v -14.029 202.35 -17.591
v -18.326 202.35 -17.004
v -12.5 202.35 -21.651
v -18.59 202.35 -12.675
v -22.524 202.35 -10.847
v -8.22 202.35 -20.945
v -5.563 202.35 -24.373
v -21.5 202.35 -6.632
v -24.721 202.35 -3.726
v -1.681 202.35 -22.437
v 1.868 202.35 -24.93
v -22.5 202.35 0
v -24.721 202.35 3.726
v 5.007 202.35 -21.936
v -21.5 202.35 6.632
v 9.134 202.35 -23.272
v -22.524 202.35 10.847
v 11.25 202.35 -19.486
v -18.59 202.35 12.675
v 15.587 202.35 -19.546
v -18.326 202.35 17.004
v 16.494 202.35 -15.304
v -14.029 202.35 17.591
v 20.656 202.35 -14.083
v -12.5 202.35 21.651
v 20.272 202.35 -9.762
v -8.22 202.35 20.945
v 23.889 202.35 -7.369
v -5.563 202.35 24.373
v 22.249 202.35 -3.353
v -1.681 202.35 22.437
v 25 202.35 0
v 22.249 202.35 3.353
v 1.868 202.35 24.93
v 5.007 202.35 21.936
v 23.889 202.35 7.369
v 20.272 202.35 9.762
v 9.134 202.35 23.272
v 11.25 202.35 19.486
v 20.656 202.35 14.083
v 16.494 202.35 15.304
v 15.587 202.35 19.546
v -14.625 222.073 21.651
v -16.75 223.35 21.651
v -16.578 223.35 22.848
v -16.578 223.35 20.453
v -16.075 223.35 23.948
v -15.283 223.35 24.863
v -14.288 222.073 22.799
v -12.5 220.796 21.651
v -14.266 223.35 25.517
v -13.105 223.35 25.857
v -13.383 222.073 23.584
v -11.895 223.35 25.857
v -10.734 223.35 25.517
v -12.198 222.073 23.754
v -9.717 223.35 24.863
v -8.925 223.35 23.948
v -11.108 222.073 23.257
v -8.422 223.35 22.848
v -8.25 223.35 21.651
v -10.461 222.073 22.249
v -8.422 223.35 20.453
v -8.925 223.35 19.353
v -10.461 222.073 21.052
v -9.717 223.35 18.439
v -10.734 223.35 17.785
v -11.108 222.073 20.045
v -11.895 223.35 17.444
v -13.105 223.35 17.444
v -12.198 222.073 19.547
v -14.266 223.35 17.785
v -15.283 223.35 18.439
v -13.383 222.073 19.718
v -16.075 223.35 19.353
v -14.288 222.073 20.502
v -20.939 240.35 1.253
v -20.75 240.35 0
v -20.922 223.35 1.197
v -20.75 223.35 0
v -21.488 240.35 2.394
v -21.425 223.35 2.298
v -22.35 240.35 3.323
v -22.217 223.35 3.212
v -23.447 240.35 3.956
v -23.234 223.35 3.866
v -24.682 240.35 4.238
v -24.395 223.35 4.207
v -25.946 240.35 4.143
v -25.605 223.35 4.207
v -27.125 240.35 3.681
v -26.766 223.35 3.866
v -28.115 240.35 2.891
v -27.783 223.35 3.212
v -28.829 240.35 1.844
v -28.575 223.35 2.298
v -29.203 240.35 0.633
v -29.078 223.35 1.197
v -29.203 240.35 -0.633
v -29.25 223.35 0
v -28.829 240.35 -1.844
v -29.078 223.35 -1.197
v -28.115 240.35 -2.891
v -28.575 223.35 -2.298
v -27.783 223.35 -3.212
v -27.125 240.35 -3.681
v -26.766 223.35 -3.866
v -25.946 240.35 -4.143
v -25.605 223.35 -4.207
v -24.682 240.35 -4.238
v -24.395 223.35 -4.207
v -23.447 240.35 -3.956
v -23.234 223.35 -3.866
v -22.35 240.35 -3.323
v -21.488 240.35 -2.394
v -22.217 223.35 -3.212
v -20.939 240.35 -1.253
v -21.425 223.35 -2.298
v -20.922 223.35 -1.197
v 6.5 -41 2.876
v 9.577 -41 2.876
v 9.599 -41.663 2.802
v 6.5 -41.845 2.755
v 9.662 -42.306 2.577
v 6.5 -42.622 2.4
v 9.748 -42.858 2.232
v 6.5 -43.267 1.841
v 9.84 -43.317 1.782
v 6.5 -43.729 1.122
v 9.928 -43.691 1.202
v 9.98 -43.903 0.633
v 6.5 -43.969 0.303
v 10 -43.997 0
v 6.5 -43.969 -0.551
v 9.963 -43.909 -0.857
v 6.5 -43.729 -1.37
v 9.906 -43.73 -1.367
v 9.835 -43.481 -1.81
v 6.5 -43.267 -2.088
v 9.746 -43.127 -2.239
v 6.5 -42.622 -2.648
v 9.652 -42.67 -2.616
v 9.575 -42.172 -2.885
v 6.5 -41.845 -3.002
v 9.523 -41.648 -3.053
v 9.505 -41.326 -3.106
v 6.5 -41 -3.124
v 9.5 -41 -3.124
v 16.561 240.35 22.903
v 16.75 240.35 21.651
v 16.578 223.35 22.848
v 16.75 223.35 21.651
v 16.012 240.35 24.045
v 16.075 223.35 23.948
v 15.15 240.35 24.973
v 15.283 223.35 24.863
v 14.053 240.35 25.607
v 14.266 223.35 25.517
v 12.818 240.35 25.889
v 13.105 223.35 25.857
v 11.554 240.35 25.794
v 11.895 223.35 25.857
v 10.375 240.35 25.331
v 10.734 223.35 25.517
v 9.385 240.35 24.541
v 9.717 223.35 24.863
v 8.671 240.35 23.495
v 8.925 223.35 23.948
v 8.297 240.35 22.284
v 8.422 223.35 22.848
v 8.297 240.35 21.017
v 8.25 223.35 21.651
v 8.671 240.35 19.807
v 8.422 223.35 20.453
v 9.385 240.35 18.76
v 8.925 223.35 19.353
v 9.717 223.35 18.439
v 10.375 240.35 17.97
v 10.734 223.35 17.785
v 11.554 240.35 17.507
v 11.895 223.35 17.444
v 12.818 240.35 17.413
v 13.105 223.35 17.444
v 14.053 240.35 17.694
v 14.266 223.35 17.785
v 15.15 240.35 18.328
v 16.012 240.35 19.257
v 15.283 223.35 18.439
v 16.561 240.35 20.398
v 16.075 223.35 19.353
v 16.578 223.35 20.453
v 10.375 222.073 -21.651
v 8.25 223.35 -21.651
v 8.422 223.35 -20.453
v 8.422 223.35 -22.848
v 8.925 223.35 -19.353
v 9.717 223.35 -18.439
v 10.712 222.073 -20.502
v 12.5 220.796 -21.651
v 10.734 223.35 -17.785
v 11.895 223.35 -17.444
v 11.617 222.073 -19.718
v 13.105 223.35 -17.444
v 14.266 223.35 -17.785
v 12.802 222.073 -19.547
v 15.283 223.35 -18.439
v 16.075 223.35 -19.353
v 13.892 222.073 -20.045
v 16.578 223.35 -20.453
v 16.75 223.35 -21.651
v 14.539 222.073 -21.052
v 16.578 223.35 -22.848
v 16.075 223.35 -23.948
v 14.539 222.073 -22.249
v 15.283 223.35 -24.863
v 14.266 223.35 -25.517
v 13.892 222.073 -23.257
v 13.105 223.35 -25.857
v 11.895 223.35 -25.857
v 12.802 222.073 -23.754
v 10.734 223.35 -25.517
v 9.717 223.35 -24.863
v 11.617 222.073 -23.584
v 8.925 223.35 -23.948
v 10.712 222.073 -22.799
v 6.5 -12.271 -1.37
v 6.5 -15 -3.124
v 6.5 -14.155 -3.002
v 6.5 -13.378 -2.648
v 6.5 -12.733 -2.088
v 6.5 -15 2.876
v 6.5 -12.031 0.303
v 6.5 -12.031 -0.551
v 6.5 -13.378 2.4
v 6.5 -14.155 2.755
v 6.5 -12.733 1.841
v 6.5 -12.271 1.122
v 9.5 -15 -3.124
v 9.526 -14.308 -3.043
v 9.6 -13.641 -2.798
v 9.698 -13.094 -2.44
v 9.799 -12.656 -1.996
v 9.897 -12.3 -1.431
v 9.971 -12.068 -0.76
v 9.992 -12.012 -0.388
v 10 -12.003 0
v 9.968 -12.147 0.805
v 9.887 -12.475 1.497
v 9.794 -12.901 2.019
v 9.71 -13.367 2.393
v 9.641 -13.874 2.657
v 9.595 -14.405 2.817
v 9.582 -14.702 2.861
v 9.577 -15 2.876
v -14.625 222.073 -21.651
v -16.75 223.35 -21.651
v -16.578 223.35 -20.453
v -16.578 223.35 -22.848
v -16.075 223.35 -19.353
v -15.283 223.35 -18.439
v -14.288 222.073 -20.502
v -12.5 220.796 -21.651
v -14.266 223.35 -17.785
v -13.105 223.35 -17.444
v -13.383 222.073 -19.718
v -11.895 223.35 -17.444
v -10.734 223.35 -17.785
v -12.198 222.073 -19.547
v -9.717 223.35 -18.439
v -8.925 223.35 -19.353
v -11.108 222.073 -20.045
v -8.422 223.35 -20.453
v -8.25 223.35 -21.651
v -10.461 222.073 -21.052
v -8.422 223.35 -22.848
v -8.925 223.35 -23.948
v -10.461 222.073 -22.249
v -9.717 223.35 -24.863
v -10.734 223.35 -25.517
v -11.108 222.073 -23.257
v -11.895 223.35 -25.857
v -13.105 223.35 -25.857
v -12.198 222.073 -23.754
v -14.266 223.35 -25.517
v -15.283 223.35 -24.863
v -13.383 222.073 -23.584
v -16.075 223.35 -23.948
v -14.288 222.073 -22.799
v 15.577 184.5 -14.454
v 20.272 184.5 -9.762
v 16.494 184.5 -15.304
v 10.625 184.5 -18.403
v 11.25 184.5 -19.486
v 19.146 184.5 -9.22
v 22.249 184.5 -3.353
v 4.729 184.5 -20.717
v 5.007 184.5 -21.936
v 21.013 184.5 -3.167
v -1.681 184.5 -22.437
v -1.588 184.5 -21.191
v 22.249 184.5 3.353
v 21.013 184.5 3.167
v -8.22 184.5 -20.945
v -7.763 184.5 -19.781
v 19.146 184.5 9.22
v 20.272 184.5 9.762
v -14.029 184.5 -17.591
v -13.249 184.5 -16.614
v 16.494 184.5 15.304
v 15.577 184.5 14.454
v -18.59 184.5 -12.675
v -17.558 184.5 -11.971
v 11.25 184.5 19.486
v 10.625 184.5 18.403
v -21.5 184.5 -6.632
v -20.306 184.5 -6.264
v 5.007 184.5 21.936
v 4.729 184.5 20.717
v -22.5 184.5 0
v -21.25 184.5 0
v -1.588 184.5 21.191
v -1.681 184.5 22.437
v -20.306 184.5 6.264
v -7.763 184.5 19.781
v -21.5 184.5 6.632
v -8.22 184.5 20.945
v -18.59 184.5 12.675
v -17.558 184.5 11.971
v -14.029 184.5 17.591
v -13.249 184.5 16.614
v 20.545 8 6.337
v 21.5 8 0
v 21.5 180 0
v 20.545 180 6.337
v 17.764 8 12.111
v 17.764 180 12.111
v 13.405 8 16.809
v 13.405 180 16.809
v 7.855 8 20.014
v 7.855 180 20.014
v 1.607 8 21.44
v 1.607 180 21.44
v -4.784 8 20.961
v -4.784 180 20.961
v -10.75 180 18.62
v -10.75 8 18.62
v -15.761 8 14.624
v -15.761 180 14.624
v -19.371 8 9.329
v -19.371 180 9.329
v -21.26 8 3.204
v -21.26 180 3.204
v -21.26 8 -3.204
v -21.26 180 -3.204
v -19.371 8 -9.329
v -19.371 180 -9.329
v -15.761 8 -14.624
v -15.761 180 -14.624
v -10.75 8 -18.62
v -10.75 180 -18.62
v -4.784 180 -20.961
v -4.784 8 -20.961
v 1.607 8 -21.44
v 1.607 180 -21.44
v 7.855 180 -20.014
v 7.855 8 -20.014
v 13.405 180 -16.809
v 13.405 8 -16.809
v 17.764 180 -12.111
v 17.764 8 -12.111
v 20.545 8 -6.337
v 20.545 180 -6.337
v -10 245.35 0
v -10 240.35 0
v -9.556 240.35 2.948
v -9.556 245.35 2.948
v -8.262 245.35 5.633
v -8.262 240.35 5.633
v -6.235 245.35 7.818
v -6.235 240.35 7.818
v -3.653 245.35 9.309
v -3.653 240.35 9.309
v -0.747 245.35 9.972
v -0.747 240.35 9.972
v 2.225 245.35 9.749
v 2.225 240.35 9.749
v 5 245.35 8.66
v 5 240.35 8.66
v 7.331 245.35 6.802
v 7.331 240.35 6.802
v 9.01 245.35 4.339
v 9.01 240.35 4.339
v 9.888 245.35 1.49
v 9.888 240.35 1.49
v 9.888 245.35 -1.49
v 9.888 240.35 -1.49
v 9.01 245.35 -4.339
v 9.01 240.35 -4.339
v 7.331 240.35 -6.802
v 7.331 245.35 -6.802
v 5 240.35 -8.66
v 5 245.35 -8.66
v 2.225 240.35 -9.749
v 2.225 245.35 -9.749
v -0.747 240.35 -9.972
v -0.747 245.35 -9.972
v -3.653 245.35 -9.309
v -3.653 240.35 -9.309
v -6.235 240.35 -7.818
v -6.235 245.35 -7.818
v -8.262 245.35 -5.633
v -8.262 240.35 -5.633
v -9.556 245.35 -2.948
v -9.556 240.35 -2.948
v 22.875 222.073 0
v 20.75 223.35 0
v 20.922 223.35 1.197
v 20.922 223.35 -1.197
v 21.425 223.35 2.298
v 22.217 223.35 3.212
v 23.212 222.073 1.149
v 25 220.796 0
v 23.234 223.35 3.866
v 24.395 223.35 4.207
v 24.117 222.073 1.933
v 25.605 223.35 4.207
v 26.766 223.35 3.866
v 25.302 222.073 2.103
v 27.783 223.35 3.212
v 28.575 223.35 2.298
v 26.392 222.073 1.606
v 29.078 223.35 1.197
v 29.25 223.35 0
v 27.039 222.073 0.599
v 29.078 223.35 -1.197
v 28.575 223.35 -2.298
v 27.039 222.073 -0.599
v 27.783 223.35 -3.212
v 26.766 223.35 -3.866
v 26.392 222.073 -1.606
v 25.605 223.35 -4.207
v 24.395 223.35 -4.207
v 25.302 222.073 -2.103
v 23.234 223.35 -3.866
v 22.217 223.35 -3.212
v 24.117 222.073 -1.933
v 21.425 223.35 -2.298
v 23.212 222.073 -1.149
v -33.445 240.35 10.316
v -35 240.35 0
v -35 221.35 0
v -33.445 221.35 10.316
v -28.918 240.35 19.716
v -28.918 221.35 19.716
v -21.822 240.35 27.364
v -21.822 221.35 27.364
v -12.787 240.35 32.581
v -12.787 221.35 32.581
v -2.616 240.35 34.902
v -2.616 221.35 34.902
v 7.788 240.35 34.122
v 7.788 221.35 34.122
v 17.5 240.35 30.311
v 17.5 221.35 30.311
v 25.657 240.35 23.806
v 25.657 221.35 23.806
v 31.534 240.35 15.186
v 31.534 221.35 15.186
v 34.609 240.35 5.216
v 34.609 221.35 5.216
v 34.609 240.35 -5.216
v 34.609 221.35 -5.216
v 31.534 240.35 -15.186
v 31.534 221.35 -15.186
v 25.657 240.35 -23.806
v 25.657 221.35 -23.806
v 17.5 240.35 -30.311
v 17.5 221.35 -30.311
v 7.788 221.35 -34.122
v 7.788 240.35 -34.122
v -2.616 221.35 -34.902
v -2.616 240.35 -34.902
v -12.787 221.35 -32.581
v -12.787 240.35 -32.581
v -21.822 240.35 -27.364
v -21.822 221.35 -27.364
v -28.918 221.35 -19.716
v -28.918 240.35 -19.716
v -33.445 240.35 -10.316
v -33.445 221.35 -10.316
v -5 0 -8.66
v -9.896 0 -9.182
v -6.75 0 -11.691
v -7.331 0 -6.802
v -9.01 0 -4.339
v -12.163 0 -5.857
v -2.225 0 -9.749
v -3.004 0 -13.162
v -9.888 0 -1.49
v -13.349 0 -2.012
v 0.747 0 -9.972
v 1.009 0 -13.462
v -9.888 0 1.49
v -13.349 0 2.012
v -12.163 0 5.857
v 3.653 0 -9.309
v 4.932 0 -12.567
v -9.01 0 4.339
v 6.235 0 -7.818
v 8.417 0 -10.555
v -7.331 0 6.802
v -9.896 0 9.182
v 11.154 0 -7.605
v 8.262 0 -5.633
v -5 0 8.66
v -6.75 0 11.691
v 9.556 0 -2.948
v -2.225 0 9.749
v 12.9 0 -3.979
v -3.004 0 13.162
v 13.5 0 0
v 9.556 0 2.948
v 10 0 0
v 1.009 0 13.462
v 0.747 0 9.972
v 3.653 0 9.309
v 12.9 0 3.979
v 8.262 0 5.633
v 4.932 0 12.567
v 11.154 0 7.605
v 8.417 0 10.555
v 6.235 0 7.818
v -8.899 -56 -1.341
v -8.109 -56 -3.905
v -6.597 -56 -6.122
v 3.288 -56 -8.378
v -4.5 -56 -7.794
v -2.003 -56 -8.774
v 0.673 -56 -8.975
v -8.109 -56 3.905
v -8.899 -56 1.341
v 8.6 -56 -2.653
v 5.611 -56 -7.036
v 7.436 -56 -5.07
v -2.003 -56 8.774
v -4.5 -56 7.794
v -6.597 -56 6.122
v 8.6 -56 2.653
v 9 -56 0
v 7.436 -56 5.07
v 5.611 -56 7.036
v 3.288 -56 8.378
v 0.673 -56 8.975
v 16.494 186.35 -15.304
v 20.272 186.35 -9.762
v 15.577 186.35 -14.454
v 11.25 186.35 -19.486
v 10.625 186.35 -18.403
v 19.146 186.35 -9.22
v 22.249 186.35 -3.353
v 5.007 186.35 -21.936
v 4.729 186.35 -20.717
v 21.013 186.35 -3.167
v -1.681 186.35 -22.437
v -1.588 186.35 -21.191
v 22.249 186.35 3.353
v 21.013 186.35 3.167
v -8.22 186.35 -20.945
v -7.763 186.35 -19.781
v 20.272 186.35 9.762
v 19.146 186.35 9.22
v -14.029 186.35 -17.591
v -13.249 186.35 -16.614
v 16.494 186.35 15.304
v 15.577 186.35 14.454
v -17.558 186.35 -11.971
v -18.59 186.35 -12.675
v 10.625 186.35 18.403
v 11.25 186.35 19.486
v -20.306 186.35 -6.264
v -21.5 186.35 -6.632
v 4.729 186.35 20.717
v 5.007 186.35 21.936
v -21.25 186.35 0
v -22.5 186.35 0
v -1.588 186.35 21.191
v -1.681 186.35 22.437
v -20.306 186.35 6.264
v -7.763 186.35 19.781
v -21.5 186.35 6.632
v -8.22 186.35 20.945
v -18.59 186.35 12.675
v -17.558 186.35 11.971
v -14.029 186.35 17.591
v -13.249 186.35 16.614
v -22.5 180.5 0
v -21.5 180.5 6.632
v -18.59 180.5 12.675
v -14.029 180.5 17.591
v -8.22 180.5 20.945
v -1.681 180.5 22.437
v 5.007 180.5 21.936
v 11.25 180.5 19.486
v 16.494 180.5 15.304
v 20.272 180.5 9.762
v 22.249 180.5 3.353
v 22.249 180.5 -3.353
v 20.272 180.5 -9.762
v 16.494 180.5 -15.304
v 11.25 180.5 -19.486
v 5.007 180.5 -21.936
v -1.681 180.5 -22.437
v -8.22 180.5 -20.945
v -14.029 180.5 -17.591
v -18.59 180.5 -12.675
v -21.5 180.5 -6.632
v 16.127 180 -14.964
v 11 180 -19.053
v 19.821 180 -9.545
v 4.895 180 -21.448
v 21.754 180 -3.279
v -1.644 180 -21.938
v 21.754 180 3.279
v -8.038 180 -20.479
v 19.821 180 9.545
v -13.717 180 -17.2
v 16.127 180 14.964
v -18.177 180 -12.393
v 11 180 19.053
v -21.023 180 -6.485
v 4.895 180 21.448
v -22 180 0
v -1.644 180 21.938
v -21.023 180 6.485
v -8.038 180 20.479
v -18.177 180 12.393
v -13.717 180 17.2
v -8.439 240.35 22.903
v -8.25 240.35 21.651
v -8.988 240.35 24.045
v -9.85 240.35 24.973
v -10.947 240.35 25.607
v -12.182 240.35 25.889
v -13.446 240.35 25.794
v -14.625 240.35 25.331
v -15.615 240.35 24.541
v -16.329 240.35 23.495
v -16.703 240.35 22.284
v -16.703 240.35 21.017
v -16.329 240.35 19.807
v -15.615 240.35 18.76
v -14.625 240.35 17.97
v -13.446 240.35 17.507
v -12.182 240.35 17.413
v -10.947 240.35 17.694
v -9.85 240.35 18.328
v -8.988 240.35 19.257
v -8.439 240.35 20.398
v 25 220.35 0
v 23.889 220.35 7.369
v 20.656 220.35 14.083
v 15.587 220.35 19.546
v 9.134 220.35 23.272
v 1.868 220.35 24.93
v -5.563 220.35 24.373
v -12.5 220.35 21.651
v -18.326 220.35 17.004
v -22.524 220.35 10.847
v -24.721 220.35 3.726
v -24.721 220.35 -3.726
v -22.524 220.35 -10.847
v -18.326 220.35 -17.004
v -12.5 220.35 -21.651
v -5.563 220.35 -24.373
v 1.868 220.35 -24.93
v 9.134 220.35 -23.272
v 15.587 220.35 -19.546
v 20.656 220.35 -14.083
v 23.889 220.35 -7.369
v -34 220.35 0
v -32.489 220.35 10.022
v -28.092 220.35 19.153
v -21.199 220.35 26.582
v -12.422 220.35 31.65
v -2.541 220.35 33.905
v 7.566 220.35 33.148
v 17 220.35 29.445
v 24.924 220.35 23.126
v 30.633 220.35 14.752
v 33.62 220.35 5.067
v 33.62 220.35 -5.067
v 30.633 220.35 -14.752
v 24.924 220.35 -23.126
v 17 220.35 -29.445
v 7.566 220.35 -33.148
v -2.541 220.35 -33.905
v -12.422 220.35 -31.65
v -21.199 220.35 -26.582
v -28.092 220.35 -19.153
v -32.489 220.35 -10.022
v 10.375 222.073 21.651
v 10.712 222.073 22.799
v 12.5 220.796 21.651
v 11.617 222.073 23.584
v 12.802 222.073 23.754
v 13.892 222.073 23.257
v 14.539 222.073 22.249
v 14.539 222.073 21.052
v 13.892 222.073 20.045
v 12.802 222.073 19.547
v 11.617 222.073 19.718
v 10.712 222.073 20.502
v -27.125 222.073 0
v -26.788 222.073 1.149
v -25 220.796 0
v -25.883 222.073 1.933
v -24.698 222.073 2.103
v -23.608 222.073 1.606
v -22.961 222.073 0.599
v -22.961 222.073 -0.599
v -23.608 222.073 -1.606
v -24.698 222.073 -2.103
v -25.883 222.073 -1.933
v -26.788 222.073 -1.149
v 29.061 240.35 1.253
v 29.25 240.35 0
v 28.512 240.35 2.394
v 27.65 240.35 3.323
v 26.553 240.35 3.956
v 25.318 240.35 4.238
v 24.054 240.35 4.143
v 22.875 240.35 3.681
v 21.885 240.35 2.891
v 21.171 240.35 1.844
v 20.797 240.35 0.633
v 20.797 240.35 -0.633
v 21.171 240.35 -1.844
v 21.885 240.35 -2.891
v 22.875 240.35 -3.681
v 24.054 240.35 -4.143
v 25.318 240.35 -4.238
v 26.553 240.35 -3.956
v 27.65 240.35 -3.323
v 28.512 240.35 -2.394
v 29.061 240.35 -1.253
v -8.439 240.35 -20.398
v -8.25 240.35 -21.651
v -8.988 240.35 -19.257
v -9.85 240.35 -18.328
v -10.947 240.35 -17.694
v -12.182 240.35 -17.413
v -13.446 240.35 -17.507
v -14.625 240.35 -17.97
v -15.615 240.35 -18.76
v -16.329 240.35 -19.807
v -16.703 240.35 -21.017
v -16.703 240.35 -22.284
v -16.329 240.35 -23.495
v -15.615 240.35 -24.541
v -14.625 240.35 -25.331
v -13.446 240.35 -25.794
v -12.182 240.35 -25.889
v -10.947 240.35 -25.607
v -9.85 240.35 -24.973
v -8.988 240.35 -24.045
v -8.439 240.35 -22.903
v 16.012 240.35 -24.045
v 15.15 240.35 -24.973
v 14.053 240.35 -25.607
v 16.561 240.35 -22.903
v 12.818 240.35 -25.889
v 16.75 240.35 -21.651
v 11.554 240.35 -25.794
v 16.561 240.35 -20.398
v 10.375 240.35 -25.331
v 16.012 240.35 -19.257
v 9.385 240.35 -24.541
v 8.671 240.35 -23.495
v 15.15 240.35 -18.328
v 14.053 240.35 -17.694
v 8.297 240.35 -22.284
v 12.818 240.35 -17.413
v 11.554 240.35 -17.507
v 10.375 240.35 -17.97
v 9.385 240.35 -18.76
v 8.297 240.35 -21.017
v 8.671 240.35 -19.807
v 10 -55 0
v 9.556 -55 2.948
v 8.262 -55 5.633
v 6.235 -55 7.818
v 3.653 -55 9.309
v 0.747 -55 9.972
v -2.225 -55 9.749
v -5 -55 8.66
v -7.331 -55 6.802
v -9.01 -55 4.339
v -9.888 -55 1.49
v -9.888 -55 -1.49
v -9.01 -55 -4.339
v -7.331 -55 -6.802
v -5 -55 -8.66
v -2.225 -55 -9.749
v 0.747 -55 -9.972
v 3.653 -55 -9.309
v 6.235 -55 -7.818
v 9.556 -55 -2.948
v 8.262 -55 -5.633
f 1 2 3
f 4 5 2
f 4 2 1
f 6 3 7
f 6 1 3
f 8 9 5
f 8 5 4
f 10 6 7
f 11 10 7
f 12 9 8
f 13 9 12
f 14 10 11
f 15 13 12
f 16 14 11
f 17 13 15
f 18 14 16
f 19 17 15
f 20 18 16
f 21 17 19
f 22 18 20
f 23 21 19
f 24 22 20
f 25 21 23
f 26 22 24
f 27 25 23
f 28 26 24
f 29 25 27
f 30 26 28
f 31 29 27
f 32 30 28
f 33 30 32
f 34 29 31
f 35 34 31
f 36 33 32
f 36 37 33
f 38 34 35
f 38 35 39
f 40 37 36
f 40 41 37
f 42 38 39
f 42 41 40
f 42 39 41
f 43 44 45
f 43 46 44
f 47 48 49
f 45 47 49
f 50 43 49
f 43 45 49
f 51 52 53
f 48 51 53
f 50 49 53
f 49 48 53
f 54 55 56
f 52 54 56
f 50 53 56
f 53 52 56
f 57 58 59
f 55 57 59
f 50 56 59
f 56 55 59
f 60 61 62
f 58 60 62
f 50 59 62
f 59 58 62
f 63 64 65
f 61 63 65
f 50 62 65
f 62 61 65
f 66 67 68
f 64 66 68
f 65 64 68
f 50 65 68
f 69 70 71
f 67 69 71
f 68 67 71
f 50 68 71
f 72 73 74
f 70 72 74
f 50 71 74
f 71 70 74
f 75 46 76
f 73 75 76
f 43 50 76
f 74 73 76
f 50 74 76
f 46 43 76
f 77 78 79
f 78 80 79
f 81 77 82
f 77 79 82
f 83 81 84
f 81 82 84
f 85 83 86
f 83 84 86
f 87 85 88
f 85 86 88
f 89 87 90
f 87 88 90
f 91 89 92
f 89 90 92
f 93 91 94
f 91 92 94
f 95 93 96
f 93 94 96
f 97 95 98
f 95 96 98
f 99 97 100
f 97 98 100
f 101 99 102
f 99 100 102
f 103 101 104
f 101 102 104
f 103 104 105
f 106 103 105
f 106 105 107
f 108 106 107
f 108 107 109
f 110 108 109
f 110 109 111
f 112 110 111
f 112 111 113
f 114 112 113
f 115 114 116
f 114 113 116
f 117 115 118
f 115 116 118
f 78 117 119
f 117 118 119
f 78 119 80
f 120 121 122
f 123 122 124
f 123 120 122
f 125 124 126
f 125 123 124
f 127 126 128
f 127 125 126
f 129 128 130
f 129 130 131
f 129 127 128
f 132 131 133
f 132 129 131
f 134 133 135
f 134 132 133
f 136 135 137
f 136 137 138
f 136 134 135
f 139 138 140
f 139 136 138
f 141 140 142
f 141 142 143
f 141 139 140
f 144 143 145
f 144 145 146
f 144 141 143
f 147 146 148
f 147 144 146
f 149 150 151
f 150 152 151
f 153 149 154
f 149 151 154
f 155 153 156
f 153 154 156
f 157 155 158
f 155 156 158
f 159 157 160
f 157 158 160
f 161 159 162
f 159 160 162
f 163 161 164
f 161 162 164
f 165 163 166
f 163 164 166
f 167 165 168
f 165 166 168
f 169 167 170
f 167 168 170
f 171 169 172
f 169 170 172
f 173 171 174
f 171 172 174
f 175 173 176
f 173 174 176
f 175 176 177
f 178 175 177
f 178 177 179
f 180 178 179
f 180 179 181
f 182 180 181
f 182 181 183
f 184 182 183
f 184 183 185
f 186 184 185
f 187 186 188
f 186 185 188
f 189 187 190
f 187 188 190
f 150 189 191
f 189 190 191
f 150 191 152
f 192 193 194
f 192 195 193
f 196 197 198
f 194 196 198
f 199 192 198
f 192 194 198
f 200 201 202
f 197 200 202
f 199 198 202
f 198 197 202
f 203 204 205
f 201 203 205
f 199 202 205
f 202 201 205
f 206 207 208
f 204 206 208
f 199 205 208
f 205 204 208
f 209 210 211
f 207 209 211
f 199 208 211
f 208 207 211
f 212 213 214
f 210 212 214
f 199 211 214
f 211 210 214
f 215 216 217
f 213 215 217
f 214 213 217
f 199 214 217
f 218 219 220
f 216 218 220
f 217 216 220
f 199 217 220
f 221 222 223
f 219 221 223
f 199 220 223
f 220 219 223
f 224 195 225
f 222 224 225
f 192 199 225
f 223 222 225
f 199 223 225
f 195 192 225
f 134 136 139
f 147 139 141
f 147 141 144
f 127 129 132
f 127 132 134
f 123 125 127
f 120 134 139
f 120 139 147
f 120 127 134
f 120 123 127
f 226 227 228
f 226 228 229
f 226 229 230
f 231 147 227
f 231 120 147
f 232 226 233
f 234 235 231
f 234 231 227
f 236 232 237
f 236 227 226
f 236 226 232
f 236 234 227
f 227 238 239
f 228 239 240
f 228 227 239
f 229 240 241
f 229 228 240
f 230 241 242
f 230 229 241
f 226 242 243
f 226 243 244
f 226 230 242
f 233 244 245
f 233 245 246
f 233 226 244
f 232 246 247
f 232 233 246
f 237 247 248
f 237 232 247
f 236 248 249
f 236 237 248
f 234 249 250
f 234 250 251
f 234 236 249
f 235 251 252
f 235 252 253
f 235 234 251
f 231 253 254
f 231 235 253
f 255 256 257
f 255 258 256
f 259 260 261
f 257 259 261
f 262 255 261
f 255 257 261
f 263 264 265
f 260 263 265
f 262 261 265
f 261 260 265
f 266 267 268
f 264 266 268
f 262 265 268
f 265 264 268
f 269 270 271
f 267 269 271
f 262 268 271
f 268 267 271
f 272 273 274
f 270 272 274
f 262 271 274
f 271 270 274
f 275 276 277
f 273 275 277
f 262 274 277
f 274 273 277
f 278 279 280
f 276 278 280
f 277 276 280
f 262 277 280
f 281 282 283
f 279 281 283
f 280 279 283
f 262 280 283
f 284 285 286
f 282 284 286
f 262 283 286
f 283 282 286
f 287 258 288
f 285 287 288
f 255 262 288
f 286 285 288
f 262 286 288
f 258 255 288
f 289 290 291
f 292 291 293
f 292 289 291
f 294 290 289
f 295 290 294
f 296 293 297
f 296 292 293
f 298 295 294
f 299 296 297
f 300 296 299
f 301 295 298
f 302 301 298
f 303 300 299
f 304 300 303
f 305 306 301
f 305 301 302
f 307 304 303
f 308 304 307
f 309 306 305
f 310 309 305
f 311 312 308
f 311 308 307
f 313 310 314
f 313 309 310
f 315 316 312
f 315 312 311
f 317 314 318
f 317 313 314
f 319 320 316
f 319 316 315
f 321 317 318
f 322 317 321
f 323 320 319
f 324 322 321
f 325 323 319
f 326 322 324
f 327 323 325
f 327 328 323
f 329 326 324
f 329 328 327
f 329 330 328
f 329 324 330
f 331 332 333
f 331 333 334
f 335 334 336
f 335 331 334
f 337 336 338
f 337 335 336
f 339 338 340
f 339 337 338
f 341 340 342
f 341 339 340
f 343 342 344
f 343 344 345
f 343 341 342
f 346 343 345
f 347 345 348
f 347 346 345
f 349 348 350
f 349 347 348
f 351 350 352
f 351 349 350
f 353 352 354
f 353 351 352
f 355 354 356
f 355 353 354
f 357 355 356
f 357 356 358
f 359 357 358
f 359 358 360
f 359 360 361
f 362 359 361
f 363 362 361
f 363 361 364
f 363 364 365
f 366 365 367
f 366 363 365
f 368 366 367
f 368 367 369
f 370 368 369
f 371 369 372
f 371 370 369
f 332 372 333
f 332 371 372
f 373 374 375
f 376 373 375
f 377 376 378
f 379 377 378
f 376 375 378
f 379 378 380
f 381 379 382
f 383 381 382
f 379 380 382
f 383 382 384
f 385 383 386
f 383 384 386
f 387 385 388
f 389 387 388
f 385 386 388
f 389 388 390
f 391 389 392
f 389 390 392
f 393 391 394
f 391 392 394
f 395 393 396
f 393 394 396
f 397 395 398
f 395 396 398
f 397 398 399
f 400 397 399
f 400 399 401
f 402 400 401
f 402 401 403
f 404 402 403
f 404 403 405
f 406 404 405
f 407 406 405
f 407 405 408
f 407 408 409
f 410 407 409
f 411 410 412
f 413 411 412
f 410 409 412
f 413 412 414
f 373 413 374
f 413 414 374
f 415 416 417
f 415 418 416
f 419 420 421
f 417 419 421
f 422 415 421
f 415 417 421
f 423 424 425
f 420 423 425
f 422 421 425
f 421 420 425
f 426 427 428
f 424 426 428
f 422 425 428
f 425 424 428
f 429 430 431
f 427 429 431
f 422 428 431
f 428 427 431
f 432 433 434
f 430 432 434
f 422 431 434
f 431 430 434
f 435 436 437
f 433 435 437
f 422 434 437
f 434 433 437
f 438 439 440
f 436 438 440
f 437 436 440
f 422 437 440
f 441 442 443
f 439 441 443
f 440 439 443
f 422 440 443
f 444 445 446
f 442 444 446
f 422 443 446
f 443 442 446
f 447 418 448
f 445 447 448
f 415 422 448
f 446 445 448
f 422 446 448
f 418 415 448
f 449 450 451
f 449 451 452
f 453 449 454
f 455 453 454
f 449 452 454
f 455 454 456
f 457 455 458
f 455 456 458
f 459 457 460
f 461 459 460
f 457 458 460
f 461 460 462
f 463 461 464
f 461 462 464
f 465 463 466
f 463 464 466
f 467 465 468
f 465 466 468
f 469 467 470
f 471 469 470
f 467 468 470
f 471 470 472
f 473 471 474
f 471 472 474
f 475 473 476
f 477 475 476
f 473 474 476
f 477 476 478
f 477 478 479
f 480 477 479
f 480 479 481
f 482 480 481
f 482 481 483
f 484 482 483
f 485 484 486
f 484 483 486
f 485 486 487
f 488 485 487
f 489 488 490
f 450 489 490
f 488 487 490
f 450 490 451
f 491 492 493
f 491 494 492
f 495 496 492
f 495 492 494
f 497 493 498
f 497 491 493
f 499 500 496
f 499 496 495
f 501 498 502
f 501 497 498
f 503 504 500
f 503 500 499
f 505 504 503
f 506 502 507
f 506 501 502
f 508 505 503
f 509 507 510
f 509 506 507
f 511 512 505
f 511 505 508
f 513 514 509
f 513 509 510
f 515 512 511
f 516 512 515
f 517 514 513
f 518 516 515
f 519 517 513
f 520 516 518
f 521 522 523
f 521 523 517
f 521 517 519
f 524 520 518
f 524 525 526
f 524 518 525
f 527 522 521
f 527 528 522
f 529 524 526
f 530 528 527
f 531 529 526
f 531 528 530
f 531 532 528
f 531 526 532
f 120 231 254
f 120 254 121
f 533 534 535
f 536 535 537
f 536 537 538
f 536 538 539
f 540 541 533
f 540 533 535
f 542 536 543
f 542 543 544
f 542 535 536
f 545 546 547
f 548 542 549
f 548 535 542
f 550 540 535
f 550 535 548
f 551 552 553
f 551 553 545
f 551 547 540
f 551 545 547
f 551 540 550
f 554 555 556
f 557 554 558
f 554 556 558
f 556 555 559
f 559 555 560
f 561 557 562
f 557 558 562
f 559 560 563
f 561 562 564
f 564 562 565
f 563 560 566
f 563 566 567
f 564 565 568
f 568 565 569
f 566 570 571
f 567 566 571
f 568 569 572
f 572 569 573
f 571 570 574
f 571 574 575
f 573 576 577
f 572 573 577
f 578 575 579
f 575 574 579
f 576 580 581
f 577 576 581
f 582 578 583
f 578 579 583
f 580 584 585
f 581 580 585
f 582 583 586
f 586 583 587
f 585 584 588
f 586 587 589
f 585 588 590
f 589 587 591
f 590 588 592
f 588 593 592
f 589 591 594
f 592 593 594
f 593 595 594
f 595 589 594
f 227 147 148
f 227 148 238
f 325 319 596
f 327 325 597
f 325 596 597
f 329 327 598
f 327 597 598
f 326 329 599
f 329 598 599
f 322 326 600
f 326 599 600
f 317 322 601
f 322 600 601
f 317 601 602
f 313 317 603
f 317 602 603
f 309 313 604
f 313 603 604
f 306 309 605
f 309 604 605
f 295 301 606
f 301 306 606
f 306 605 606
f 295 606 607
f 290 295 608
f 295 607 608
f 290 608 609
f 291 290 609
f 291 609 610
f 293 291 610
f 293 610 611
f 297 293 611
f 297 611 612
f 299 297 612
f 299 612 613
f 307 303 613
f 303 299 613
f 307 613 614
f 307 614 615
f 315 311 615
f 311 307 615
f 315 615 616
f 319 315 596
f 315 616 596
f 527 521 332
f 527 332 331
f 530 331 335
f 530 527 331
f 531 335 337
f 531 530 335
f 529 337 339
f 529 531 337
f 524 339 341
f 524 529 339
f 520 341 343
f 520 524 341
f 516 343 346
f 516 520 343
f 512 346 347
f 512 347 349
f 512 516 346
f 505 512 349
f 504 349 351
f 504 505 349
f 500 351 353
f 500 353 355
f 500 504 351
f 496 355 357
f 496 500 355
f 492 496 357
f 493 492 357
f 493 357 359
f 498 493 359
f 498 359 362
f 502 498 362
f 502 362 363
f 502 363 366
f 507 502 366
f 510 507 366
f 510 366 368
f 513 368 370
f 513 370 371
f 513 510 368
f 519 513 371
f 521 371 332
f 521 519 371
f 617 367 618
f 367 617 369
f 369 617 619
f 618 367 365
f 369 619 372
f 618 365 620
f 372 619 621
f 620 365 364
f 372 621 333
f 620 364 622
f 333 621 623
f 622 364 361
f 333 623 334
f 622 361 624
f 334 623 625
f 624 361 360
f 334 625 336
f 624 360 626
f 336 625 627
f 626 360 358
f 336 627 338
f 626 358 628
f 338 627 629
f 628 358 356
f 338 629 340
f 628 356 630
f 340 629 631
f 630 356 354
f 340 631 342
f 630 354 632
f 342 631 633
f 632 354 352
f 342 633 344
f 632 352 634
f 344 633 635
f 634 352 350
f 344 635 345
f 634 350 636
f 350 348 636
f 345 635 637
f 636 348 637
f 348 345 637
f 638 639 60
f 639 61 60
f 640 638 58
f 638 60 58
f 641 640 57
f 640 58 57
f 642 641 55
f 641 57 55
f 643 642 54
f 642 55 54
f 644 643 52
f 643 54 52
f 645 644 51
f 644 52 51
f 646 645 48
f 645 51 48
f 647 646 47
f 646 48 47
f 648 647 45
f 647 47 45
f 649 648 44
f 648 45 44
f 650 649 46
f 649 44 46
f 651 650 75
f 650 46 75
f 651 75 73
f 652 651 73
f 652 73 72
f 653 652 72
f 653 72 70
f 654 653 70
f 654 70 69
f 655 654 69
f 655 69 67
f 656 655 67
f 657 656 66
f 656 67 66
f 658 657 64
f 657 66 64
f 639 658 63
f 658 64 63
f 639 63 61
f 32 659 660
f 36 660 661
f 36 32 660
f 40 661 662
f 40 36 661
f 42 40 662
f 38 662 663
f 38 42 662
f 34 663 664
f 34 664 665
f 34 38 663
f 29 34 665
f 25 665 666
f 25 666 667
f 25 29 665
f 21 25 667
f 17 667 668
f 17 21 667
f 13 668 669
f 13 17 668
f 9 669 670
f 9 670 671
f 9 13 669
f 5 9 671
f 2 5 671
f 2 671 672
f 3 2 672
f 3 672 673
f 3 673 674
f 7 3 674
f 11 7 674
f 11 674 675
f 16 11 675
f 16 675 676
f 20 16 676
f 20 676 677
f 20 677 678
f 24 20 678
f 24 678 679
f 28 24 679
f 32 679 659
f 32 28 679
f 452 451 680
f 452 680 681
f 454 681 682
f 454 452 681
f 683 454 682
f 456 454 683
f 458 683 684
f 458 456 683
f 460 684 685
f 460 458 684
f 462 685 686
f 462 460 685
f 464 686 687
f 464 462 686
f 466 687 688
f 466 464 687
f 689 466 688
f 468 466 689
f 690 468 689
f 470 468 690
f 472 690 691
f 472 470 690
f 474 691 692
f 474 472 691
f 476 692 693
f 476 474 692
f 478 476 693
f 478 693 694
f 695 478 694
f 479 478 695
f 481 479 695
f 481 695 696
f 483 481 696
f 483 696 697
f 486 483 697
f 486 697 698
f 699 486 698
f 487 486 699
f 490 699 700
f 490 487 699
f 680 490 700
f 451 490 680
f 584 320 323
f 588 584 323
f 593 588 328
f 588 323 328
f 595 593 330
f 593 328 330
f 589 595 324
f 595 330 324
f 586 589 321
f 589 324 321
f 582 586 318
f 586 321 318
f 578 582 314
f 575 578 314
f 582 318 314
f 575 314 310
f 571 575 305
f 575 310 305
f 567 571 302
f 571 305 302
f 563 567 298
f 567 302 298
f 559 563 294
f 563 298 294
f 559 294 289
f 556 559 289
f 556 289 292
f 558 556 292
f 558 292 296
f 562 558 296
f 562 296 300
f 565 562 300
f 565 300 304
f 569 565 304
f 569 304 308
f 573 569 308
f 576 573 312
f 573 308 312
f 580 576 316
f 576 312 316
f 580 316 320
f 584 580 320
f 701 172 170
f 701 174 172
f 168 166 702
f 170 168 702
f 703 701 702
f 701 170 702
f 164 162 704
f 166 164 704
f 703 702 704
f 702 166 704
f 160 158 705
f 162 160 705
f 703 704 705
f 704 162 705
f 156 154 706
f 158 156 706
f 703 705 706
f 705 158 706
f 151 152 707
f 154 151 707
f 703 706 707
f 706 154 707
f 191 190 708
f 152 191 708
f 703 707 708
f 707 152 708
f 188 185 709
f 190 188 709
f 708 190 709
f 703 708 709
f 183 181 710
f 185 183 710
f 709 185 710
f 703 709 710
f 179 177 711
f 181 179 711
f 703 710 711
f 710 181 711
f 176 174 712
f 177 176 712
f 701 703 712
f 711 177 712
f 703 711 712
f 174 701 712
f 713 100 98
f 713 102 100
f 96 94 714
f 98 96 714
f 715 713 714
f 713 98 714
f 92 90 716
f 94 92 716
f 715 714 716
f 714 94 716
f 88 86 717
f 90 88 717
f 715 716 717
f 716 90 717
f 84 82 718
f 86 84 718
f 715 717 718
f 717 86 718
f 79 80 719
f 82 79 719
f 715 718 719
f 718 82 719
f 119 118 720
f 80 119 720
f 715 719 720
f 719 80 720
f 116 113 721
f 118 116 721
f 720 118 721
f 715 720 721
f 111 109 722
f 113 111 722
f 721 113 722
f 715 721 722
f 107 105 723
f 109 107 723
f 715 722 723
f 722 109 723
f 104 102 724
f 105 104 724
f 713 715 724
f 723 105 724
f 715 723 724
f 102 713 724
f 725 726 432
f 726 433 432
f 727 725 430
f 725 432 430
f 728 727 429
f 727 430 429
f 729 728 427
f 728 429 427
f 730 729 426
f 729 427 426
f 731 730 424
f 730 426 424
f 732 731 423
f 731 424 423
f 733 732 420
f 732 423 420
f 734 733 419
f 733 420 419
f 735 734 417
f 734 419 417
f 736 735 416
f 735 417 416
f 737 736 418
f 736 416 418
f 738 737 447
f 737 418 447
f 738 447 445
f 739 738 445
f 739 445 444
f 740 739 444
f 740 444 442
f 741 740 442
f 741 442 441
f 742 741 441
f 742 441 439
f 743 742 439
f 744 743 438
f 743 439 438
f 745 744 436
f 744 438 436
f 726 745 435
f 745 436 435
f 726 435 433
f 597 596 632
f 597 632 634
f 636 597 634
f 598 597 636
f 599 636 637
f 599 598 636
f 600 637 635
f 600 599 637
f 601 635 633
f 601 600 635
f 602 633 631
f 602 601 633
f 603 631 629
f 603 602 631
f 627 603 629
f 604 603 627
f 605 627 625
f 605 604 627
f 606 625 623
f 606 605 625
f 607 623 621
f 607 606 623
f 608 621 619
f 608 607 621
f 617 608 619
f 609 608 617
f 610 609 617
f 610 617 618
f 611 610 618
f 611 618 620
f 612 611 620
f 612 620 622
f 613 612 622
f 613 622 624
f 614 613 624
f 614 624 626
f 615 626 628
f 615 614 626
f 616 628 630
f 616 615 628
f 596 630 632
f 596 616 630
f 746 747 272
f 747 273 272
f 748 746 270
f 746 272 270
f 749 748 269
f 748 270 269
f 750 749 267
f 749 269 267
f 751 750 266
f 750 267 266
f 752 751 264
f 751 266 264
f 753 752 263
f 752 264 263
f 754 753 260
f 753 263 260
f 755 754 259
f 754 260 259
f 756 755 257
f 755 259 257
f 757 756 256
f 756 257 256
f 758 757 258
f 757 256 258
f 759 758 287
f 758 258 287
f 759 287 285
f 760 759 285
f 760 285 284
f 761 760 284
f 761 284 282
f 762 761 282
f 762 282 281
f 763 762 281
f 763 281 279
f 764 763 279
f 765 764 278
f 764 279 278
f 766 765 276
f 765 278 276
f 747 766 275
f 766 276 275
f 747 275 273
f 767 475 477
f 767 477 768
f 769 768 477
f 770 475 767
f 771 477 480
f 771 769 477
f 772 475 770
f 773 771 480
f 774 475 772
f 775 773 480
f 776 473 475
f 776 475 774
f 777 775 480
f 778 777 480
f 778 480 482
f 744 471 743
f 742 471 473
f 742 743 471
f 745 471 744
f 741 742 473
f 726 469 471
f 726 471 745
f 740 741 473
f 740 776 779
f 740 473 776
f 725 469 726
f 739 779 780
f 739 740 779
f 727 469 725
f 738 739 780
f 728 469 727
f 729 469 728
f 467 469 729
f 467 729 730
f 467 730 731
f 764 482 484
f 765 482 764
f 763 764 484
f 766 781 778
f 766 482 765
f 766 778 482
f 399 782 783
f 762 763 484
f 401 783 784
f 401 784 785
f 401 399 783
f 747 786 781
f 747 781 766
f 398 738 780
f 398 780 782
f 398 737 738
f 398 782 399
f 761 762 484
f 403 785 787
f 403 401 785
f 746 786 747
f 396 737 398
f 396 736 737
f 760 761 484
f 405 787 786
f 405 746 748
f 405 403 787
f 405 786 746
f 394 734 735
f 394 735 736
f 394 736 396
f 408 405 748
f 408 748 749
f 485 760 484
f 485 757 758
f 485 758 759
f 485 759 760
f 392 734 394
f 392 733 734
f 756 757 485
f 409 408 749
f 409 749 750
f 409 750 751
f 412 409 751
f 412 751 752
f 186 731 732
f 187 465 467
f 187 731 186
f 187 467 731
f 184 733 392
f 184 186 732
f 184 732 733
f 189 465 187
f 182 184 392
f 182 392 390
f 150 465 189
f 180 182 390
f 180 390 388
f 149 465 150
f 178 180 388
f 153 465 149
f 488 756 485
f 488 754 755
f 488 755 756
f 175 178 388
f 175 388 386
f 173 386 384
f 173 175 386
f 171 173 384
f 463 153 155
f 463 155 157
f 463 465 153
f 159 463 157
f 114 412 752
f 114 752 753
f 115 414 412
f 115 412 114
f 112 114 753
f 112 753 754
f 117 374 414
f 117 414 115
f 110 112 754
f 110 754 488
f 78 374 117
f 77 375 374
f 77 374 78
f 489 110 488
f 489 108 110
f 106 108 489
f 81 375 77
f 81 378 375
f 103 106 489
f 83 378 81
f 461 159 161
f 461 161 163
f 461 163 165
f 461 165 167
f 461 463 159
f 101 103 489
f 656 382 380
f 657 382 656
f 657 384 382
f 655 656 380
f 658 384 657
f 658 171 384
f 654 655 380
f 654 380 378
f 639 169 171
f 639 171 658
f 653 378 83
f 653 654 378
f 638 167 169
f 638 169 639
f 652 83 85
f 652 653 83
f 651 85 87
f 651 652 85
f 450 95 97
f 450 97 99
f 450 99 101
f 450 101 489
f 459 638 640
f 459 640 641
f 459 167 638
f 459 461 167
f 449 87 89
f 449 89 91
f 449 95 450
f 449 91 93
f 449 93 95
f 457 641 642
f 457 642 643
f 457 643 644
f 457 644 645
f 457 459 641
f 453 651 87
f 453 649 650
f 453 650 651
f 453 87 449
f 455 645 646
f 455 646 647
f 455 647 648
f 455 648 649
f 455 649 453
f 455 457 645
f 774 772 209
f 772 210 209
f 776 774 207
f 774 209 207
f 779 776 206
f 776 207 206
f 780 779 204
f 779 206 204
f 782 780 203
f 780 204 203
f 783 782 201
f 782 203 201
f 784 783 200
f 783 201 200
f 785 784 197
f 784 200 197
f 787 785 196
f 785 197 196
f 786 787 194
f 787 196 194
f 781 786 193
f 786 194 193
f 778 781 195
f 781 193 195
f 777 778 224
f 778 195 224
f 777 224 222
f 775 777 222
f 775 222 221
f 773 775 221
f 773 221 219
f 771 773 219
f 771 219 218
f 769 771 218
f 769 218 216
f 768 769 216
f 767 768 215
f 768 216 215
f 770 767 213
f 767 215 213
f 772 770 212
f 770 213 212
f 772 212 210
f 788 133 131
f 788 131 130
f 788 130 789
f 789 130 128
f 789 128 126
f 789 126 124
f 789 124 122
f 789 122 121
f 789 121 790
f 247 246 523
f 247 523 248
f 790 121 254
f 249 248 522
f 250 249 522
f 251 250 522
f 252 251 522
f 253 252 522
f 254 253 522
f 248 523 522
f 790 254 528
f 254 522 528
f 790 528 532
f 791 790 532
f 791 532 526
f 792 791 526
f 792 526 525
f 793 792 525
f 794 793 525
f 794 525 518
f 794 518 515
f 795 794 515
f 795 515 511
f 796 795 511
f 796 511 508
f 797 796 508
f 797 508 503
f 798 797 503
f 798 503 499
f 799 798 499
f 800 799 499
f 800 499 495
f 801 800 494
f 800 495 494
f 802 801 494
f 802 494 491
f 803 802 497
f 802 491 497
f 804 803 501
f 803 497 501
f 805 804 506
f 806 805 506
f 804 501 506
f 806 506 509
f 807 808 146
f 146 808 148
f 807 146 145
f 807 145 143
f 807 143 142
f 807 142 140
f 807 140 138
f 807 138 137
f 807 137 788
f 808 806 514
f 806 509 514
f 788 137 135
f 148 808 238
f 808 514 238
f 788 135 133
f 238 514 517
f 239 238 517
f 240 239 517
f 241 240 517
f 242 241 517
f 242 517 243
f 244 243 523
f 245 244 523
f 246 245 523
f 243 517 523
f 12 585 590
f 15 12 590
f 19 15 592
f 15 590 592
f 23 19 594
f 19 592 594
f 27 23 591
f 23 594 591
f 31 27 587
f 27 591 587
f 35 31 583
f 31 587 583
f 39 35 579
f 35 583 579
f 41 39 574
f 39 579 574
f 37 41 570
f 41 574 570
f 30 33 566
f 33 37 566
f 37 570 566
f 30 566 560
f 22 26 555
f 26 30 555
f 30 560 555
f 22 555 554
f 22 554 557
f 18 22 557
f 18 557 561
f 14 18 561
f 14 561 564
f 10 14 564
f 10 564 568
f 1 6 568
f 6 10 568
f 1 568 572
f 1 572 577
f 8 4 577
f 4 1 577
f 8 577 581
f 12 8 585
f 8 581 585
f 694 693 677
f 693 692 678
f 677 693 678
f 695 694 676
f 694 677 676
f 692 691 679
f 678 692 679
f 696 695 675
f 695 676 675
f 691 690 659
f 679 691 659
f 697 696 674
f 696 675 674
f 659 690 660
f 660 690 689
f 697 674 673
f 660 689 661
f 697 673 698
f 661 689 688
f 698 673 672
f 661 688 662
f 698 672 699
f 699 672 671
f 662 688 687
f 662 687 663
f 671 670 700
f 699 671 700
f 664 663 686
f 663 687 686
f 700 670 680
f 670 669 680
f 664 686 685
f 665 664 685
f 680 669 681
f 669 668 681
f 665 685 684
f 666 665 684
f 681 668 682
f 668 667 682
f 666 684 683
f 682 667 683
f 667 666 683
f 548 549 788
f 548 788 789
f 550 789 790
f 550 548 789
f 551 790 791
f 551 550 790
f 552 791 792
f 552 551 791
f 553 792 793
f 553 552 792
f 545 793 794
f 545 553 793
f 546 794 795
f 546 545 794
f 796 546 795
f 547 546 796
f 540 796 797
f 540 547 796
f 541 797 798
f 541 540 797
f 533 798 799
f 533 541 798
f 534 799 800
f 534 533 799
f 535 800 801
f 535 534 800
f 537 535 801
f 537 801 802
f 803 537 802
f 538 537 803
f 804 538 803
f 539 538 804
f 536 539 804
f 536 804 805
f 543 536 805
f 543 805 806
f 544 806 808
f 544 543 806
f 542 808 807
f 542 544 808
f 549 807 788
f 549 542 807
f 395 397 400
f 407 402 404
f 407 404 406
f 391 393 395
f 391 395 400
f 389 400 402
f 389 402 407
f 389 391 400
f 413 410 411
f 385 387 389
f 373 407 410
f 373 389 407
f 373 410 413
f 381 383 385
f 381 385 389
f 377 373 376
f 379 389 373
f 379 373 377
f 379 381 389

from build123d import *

# Parameters (mm, degrees)
F0_R      = 10
F1_DEPTH  = 56
F2_R      = 21.5
F3_DEPTH  = 180
F4_SIZE   = 8
F6_R      = 22.5
F7_DEPTH  = 40.35
F8_R      = 35
F9_DEPTH  = 20
F11_R     = 31.0096244967
F11_R_2   = 21.25
F12_DEPTH = 1.85
F15_DEPTH = 25
F16_SIZE  = 1
F18_SIZE  = 0.5
F17_R     = 10
F19_DEPTH = 5
F22_D     = 8.5
F22_DEPTH = 17
F22_TIP   = 2.5536576309
F23_SIZE  = 1
F25_R     = 25
F26_DEPTH = 18


with BuildPart() as f1:
    # F0 (on Front) → F1 (new body)
    with BuildSketch(Plane.XZ):
        Circle(F0_R)
    extrude(amount=F1_DEPTH)

    # F2 (on Front) → F3 (join)
    with BuildSketch(Plane.XZ):
        Circle(F2_R)
    extrude(amount=-F3_DEPTH)

    # F4
    f4_edges = [f1.edges().sort_by_distance(p)[0] for p in [
        (-21.5, 0, 0),
    ]]
    chamfer(f4_edges, length=F4_SIZE)

    # F6 (on offset) → F7 (join)
    with BuildSketch(Plane(origin=(0, 180, 0), x_dir=(-1, 0, 0), z_dir=(0, 1, 0))):
        Circle(F6_R)
    extrude(amount=F7_DEPTH)

    # F8 (on face) → F9 (join)
    with BuildSketch(Plane(origin=(0, 220.35, 0), x_dir=(-1, 0, 0), z_dir=(0, 1, 0))):
        Circle(F8_R)
    extrude(amount=F9_DEPTH)

    # F11 (on offset) → F12 (cut)
    with BuildSketch(Plane(origin=(0, 184.5, 0), x_dir=(-1, 0, 0), z_dir=(0, 1, 0))):
        Circle(F11_R)
        Circle(F11_R_2, mode=Mode.SUBTRACT)
    extrude(amount=F12_DEPTH, mode=Mode.SUBTRACT)

    # F14 (on offset) → F15 (cut)
    with BuildSketch(Plane.YZ.offset(6.5)):
        with BuildLine():
            Line((-15, 2.8761793831), (-41, 2.8761793831))
            ThreePointArc((-41, 2.8761793831), (-44, -0.1238206169), (-41, -3.1238206169))
            Line((-41, -3.1238206169), (-15, -3.1238206169))
            ThreePointArc((-15, -3.1238206169), (-12, -0.1238206169), (-15, 2.8761793831))
        make_face()
    extrude(amount=F15_DEPTH, mode=Mode.SUBTRACT)

    # F16
    f16_edges = [f1.edges().sort_by_distance(p)[0] for p in [
        (-10, -56, 0),
    ]]
    chamfer(f16_edges, length=F16_SIZE)

    # F18
    f18_edges = [f1.edges().sort_by_distance(p)[0] for p in [
        (22.5, 180, 0),
    ]]
    chamfer(f18_edges, length=F18_SIZE)

    # F17 (on face) → F19 (join)
    with BuildSketch(Plane(origin=(0, 240.35, 0), x_dir=(-1, 0, 0), z_dir=(0, 1, 0))):
        Circle(F17_R)
    extrude(amount=F19_DEPTH)

    # F22
    with Locations(Plane(origin=(0, 240.35, 0), x_dir=(-1, 0, 0), z_dir=(0, 1, 0))):
        with Locations((-12.5, 21.6506350946), (12.5, 21.6506350946), (25, 0), (12.5, -21.6506350946), (-12.5, -21.6506350946), (-25, 0)):
            Hole(F22_D / 2, depth=F22_DEPTH)
            with Locations((0, 0, -(F22_DEPTH + F22_TIP / 2))):  # 118° drill point
                Cone(0, F22_D / 2, F22_TIP, mode=Mode.SUBTRACT)

    # F23
    f23_edges = [f1.edges().sort_by_distance(p)[0] for p in [
        (35, 220.35, 0),
    ]]
    chamfer(f23_edges, length=F23_SIZE)

    # F25 (on offset) → F26 (join)
    with BuildSketch(Plane.XZ.offset(-202.35)):
        Circle(F25_R)
    extrude(amount=-F26_DEPTH)


solid = f1.part
